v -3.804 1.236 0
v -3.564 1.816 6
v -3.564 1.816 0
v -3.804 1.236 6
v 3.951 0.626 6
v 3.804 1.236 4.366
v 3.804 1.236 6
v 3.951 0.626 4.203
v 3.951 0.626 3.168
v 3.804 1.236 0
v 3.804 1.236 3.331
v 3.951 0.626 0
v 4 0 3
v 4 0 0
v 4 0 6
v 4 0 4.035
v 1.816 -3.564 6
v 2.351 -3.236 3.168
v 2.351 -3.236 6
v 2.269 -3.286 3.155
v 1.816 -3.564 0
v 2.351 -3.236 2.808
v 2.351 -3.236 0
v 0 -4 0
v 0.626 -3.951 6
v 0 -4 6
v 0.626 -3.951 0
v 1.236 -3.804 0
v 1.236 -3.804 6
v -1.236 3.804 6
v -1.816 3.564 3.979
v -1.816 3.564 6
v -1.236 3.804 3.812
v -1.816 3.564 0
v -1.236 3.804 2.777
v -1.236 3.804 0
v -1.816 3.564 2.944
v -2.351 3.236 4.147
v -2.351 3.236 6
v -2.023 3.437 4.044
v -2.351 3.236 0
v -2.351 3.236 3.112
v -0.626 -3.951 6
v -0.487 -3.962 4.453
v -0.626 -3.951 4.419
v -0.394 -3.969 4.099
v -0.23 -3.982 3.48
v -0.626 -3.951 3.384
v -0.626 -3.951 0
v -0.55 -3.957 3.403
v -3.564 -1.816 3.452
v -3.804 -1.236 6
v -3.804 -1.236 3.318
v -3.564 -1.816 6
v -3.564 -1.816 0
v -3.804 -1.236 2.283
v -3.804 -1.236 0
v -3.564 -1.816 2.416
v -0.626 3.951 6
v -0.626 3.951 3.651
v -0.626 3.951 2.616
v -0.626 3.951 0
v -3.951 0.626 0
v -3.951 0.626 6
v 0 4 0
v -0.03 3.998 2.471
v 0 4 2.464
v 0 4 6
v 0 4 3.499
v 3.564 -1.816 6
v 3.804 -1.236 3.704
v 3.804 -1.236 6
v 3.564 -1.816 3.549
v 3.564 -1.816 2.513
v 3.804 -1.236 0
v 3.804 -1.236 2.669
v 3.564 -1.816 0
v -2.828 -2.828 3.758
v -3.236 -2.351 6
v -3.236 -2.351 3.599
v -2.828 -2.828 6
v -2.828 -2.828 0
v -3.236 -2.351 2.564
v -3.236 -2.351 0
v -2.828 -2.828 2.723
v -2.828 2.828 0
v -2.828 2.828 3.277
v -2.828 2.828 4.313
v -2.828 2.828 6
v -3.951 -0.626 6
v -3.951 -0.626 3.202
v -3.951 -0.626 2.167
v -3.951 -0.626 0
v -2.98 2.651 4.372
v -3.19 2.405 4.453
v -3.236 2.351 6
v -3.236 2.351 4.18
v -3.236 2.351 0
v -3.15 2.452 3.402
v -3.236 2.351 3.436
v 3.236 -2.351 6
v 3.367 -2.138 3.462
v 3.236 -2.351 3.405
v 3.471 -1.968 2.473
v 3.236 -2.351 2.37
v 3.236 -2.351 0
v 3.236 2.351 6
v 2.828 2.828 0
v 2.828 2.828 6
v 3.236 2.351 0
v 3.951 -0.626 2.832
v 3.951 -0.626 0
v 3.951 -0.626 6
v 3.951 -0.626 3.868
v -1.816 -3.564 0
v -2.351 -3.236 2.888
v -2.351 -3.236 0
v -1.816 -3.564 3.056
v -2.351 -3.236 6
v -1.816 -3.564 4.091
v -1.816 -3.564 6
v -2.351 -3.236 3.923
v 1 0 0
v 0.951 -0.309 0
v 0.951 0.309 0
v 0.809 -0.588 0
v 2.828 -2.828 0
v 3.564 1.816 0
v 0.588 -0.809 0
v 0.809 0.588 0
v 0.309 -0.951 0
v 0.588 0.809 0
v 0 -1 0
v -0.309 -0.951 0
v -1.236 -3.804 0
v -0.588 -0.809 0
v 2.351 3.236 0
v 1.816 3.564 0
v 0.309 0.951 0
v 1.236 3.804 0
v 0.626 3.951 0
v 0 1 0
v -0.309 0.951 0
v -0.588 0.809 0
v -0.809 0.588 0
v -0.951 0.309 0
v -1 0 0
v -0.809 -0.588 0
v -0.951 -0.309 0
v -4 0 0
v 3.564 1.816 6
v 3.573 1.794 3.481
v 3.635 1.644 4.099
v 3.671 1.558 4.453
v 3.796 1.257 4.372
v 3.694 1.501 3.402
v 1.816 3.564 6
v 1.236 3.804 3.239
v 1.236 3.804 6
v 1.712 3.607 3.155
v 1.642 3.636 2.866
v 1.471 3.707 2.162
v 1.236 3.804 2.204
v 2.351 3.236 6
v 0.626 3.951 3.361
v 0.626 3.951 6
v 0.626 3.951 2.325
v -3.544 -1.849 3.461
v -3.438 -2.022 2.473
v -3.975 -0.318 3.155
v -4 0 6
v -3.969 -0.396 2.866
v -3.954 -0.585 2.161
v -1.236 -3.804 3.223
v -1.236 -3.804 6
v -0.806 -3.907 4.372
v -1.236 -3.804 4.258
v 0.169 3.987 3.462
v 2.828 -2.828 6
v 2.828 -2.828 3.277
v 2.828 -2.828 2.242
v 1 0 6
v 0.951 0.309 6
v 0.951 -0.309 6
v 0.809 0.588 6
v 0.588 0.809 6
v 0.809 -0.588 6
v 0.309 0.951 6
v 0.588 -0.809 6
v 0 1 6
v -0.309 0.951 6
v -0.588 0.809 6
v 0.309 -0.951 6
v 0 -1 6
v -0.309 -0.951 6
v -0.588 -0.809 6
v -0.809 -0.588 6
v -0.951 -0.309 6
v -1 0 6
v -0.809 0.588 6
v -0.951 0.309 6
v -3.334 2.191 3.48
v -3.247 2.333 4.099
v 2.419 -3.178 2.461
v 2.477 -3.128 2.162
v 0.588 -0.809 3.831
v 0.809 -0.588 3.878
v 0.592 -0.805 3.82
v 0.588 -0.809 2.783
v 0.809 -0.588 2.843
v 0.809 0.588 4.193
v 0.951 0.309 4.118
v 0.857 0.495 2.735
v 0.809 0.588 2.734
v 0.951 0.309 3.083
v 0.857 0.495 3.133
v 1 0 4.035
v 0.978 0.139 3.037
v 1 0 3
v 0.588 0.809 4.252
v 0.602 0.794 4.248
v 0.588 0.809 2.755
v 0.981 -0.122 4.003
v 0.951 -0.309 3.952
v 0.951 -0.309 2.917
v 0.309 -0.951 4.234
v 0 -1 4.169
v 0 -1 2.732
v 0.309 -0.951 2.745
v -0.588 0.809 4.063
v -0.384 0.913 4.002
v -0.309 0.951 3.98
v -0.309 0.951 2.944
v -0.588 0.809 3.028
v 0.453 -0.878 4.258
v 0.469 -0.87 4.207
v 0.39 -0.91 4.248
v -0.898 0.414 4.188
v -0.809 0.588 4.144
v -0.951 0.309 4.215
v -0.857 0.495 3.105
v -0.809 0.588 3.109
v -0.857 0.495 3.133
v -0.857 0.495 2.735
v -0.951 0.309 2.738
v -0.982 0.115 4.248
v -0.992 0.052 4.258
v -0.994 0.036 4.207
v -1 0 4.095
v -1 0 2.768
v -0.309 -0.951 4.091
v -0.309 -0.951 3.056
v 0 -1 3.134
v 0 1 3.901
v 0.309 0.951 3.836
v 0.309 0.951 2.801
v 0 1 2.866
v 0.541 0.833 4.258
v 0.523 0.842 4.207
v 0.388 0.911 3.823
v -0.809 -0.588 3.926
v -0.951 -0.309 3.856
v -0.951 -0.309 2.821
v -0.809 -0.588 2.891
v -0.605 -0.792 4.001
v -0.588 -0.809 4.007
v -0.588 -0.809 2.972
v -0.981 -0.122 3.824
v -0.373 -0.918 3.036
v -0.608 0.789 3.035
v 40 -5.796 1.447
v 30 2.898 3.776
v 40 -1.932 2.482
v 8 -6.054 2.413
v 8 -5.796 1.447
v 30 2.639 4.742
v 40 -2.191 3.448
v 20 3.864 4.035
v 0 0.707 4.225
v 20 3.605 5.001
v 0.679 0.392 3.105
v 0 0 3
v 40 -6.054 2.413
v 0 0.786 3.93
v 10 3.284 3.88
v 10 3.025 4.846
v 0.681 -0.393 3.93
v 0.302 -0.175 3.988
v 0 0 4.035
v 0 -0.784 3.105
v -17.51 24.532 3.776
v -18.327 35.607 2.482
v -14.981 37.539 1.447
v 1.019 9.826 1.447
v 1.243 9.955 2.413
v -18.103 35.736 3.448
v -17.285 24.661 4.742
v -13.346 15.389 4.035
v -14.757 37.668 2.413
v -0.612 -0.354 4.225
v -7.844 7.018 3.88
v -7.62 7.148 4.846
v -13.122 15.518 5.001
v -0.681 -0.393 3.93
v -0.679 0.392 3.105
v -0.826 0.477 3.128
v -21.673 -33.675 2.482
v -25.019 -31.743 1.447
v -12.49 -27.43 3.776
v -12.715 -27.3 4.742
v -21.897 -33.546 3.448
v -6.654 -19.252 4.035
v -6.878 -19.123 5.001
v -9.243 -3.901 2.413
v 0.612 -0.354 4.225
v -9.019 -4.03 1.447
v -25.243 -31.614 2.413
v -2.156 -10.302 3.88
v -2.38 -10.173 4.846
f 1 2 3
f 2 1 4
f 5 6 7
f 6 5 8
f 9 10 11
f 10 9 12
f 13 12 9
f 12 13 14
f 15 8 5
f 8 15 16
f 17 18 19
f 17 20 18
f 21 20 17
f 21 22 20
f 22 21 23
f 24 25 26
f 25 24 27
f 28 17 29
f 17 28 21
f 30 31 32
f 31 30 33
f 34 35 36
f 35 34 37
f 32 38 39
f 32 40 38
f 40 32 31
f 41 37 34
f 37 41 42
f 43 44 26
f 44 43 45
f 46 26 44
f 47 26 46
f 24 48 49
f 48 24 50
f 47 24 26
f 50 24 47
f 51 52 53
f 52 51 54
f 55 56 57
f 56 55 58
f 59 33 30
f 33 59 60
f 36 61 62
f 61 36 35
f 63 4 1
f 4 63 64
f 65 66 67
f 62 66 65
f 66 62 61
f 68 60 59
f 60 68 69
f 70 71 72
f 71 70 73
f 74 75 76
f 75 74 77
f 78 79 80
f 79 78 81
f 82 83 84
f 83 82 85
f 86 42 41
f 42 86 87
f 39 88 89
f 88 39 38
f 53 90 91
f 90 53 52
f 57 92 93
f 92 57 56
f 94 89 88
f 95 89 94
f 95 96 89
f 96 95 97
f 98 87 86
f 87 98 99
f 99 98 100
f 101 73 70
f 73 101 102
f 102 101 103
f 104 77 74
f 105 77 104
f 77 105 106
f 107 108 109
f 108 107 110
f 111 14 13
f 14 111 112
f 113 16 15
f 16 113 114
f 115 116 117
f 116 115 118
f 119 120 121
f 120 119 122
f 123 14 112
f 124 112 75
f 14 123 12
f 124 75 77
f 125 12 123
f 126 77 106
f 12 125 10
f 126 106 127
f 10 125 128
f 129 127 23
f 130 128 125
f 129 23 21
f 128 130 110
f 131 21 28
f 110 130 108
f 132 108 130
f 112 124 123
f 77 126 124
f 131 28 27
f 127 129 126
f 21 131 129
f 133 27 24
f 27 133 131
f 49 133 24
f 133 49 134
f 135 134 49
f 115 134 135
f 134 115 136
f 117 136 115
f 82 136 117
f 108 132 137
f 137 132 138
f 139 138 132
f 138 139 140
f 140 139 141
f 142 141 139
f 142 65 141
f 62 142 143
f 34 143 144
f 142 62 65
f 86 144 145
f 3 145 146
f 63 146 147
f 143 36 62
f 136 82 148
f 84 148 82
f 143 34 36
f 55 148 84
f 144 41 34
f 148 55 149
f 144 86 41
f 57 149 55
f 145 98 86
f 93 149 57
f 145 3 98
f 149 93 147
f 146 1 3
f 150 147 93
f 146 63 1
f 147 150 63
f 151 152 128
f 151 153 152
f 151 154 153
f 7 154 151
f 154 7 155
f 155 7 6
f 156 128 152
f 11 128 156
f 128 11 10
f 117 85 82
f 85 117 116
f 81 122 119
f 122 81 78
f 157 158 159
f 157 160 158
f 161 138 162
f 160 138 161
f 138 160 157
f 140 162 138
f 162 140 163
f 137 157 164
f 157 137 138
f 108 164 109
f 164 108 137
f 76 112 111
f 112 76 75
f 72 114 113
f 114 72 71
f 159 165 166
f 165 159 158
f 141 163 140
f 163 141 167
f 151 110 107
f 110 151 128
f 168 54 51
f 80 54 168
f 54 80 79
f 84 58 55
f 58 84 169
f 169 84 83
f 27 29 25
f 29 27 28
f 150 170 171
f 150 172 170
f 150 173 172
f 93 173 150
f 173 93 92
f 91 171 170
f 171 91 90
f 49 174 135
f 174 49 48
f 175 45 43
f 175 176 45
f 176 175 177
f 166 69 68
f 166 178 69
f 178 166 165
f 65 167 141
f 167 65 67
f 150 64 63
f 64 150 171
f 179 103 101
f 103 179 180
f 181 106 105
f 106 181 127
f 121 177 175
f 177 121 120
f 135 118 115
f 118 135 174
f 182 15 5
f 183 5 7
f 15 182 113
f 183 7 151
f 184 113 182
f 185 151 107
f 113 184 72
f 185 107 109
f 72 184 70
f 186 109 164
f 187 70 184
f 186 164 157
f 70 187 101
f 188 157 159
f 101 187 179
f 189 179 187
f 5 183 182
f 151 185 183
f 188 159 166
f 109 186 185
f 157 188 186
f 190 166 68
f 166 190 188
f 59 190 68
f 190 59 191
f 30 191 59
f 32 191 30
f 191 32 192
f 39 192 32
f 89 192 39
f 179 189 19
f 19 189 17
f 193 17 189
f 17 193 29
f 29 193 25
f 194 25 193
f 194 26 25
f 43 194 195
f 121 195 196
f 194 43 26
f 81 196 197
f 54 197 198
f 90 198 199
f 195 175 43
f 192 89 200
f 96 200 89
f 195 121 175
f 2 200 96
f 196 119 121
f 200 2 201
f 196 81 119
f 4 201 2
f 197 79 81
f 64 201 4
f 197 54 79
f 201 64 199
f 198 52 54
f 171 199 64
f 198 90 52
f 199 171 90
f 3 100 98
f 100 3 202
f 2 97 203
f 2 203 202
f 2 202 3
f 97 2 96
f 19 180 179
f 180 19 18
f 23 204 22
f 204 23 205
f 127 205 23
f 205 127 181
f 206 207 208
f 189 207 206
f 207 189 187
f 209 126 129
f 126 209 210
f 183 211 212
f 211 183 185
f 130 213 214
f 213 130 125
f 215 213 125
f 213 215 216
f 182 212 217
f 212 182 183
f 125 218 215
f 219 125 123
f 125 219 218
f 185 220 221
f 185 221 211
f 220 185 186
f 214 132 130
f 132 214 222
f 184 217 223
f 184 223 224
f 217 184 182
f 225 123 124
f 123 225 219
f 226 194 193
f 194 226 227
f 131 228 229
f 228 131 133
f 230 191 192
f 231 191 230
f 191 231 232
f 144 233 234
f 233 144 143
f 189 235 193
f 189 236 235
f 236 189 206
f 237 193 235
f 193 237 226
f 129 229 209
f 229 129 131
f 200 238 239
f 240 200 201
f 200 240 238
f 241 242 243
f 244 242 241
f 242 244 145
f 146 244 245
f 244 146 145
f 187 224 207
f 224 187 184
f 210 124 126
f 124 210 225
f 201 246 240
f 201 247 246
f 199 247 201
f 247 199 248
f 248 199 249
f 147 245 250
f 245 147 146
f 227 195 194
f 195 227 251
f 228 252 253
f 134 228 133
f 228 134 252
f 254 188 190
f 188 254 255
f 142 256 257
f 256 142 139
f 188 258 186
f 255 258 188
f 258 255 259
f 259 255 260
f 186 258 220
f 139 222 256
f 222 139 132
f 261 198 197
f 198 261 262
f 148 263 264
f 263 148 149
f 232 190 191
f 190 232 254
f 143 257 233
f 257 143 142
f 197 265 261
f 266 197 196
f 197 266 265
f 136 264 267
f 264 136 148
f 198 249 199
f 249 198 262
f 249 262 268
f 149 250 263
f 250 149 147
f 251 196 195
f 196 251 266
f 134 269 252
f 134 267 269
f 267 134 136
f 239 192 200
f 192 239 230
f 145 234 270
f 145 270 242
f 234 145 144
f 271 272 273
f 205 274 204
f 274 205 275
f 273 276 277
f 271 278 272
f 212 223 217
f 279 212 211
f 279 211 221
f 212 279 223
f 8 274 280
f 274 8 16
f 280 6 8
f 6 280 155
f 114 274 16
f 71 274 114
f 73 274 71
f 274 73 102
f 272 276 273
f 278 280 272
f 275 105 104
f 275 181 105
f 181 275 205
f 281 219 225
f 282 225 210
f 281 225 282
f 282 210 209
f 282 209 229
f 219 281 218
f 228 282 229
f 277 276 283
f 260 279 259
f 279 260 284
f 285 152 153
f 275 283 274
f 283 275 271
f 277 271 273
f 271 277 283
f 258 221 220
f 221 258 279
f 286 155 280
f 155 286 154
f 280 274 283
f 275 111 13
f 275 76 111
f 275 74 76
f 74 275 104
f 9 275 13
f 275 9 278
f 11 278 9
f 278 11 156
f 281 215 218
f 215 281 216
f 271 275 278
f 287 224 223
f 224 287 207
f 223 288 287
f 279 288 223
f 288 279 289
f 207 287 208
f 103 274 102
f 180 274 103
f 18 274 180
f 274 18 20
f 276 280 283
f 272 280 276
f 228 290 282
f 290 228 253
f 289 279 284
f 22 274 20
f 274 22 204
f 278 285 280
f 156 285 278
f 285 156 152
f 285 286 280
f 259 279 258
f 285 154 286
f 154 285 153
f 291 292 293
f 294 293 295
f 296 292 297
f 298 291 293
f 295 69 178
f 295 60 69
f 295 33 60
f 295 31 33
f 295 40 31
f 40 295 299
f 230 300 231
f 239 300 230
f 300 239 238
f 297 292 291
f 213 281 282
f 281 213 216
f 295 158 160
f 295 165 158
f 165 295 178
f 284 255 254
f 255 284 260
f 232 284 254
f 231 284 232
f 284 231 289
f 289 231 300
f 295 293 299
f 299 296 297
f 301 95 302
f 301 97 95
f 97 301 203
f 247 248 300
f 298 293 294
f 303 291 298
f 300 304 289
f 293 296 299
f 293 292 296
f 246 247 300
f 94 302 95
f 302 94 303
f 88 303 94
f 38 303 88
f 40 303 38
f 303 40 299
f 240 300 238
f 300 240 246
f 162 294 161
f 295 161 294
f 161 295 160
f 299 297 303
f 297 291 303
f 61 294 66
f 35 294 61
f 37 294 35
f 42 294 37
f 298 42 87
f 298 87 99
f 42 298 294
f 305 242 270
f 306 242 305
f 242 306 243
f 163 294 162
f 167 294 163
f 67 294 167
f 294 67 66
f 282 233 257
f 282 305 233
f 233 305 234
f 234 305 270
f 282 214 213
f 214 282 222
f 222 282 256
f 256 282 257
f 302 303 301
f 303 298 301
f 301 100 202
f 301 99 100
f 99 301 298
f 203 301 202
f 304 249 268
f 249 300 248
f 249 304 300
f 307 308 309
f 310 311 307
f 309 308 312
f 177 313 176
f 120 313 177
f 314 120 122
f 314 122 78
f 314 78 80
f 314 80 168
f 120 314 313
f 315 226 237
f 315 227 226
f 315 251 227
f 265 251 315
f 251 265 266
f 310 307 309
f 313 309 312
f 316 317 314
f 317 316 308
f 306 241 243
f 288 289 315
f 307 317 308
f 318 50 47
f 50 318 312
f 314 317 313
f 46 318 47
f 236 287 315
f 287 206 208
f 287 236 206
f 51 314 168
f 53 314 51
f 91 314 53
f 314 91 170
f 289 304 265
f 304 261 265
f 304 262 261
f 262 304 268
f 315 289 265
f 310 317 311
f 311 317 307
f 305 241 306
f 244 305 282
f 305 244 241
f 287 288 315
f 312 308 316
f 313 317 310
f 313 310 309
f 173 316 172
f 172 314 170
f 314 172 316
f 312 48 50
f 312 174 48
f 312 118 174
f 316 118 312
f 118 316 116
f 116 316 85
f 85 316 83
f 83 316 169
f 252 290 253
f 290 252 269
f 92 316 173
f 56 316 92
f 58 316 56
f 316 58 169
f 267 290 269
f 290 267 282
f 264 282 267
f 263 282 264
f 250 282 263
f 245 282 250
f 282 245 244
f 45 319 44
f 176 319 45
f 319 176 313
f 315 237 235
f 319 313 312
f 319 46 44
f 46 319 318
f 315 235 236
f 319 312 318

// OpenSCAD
difference(){
  cylinder(d=8,h=6,$fn=40);
  translate([0,0,-.01]) cylinder(d=2,h=6.02,$fn=20);
}
translate([0,0,3]) for(r=[0:2]) rotate([0,0,r*120])
   rotate([15,0]) translate([0,2]) linear_extrude(1) polygon([[0,-1],[10,1.4],[20,2],[30,1],[40,-4],[40,-8],[8,-8],[0,-4]]);
